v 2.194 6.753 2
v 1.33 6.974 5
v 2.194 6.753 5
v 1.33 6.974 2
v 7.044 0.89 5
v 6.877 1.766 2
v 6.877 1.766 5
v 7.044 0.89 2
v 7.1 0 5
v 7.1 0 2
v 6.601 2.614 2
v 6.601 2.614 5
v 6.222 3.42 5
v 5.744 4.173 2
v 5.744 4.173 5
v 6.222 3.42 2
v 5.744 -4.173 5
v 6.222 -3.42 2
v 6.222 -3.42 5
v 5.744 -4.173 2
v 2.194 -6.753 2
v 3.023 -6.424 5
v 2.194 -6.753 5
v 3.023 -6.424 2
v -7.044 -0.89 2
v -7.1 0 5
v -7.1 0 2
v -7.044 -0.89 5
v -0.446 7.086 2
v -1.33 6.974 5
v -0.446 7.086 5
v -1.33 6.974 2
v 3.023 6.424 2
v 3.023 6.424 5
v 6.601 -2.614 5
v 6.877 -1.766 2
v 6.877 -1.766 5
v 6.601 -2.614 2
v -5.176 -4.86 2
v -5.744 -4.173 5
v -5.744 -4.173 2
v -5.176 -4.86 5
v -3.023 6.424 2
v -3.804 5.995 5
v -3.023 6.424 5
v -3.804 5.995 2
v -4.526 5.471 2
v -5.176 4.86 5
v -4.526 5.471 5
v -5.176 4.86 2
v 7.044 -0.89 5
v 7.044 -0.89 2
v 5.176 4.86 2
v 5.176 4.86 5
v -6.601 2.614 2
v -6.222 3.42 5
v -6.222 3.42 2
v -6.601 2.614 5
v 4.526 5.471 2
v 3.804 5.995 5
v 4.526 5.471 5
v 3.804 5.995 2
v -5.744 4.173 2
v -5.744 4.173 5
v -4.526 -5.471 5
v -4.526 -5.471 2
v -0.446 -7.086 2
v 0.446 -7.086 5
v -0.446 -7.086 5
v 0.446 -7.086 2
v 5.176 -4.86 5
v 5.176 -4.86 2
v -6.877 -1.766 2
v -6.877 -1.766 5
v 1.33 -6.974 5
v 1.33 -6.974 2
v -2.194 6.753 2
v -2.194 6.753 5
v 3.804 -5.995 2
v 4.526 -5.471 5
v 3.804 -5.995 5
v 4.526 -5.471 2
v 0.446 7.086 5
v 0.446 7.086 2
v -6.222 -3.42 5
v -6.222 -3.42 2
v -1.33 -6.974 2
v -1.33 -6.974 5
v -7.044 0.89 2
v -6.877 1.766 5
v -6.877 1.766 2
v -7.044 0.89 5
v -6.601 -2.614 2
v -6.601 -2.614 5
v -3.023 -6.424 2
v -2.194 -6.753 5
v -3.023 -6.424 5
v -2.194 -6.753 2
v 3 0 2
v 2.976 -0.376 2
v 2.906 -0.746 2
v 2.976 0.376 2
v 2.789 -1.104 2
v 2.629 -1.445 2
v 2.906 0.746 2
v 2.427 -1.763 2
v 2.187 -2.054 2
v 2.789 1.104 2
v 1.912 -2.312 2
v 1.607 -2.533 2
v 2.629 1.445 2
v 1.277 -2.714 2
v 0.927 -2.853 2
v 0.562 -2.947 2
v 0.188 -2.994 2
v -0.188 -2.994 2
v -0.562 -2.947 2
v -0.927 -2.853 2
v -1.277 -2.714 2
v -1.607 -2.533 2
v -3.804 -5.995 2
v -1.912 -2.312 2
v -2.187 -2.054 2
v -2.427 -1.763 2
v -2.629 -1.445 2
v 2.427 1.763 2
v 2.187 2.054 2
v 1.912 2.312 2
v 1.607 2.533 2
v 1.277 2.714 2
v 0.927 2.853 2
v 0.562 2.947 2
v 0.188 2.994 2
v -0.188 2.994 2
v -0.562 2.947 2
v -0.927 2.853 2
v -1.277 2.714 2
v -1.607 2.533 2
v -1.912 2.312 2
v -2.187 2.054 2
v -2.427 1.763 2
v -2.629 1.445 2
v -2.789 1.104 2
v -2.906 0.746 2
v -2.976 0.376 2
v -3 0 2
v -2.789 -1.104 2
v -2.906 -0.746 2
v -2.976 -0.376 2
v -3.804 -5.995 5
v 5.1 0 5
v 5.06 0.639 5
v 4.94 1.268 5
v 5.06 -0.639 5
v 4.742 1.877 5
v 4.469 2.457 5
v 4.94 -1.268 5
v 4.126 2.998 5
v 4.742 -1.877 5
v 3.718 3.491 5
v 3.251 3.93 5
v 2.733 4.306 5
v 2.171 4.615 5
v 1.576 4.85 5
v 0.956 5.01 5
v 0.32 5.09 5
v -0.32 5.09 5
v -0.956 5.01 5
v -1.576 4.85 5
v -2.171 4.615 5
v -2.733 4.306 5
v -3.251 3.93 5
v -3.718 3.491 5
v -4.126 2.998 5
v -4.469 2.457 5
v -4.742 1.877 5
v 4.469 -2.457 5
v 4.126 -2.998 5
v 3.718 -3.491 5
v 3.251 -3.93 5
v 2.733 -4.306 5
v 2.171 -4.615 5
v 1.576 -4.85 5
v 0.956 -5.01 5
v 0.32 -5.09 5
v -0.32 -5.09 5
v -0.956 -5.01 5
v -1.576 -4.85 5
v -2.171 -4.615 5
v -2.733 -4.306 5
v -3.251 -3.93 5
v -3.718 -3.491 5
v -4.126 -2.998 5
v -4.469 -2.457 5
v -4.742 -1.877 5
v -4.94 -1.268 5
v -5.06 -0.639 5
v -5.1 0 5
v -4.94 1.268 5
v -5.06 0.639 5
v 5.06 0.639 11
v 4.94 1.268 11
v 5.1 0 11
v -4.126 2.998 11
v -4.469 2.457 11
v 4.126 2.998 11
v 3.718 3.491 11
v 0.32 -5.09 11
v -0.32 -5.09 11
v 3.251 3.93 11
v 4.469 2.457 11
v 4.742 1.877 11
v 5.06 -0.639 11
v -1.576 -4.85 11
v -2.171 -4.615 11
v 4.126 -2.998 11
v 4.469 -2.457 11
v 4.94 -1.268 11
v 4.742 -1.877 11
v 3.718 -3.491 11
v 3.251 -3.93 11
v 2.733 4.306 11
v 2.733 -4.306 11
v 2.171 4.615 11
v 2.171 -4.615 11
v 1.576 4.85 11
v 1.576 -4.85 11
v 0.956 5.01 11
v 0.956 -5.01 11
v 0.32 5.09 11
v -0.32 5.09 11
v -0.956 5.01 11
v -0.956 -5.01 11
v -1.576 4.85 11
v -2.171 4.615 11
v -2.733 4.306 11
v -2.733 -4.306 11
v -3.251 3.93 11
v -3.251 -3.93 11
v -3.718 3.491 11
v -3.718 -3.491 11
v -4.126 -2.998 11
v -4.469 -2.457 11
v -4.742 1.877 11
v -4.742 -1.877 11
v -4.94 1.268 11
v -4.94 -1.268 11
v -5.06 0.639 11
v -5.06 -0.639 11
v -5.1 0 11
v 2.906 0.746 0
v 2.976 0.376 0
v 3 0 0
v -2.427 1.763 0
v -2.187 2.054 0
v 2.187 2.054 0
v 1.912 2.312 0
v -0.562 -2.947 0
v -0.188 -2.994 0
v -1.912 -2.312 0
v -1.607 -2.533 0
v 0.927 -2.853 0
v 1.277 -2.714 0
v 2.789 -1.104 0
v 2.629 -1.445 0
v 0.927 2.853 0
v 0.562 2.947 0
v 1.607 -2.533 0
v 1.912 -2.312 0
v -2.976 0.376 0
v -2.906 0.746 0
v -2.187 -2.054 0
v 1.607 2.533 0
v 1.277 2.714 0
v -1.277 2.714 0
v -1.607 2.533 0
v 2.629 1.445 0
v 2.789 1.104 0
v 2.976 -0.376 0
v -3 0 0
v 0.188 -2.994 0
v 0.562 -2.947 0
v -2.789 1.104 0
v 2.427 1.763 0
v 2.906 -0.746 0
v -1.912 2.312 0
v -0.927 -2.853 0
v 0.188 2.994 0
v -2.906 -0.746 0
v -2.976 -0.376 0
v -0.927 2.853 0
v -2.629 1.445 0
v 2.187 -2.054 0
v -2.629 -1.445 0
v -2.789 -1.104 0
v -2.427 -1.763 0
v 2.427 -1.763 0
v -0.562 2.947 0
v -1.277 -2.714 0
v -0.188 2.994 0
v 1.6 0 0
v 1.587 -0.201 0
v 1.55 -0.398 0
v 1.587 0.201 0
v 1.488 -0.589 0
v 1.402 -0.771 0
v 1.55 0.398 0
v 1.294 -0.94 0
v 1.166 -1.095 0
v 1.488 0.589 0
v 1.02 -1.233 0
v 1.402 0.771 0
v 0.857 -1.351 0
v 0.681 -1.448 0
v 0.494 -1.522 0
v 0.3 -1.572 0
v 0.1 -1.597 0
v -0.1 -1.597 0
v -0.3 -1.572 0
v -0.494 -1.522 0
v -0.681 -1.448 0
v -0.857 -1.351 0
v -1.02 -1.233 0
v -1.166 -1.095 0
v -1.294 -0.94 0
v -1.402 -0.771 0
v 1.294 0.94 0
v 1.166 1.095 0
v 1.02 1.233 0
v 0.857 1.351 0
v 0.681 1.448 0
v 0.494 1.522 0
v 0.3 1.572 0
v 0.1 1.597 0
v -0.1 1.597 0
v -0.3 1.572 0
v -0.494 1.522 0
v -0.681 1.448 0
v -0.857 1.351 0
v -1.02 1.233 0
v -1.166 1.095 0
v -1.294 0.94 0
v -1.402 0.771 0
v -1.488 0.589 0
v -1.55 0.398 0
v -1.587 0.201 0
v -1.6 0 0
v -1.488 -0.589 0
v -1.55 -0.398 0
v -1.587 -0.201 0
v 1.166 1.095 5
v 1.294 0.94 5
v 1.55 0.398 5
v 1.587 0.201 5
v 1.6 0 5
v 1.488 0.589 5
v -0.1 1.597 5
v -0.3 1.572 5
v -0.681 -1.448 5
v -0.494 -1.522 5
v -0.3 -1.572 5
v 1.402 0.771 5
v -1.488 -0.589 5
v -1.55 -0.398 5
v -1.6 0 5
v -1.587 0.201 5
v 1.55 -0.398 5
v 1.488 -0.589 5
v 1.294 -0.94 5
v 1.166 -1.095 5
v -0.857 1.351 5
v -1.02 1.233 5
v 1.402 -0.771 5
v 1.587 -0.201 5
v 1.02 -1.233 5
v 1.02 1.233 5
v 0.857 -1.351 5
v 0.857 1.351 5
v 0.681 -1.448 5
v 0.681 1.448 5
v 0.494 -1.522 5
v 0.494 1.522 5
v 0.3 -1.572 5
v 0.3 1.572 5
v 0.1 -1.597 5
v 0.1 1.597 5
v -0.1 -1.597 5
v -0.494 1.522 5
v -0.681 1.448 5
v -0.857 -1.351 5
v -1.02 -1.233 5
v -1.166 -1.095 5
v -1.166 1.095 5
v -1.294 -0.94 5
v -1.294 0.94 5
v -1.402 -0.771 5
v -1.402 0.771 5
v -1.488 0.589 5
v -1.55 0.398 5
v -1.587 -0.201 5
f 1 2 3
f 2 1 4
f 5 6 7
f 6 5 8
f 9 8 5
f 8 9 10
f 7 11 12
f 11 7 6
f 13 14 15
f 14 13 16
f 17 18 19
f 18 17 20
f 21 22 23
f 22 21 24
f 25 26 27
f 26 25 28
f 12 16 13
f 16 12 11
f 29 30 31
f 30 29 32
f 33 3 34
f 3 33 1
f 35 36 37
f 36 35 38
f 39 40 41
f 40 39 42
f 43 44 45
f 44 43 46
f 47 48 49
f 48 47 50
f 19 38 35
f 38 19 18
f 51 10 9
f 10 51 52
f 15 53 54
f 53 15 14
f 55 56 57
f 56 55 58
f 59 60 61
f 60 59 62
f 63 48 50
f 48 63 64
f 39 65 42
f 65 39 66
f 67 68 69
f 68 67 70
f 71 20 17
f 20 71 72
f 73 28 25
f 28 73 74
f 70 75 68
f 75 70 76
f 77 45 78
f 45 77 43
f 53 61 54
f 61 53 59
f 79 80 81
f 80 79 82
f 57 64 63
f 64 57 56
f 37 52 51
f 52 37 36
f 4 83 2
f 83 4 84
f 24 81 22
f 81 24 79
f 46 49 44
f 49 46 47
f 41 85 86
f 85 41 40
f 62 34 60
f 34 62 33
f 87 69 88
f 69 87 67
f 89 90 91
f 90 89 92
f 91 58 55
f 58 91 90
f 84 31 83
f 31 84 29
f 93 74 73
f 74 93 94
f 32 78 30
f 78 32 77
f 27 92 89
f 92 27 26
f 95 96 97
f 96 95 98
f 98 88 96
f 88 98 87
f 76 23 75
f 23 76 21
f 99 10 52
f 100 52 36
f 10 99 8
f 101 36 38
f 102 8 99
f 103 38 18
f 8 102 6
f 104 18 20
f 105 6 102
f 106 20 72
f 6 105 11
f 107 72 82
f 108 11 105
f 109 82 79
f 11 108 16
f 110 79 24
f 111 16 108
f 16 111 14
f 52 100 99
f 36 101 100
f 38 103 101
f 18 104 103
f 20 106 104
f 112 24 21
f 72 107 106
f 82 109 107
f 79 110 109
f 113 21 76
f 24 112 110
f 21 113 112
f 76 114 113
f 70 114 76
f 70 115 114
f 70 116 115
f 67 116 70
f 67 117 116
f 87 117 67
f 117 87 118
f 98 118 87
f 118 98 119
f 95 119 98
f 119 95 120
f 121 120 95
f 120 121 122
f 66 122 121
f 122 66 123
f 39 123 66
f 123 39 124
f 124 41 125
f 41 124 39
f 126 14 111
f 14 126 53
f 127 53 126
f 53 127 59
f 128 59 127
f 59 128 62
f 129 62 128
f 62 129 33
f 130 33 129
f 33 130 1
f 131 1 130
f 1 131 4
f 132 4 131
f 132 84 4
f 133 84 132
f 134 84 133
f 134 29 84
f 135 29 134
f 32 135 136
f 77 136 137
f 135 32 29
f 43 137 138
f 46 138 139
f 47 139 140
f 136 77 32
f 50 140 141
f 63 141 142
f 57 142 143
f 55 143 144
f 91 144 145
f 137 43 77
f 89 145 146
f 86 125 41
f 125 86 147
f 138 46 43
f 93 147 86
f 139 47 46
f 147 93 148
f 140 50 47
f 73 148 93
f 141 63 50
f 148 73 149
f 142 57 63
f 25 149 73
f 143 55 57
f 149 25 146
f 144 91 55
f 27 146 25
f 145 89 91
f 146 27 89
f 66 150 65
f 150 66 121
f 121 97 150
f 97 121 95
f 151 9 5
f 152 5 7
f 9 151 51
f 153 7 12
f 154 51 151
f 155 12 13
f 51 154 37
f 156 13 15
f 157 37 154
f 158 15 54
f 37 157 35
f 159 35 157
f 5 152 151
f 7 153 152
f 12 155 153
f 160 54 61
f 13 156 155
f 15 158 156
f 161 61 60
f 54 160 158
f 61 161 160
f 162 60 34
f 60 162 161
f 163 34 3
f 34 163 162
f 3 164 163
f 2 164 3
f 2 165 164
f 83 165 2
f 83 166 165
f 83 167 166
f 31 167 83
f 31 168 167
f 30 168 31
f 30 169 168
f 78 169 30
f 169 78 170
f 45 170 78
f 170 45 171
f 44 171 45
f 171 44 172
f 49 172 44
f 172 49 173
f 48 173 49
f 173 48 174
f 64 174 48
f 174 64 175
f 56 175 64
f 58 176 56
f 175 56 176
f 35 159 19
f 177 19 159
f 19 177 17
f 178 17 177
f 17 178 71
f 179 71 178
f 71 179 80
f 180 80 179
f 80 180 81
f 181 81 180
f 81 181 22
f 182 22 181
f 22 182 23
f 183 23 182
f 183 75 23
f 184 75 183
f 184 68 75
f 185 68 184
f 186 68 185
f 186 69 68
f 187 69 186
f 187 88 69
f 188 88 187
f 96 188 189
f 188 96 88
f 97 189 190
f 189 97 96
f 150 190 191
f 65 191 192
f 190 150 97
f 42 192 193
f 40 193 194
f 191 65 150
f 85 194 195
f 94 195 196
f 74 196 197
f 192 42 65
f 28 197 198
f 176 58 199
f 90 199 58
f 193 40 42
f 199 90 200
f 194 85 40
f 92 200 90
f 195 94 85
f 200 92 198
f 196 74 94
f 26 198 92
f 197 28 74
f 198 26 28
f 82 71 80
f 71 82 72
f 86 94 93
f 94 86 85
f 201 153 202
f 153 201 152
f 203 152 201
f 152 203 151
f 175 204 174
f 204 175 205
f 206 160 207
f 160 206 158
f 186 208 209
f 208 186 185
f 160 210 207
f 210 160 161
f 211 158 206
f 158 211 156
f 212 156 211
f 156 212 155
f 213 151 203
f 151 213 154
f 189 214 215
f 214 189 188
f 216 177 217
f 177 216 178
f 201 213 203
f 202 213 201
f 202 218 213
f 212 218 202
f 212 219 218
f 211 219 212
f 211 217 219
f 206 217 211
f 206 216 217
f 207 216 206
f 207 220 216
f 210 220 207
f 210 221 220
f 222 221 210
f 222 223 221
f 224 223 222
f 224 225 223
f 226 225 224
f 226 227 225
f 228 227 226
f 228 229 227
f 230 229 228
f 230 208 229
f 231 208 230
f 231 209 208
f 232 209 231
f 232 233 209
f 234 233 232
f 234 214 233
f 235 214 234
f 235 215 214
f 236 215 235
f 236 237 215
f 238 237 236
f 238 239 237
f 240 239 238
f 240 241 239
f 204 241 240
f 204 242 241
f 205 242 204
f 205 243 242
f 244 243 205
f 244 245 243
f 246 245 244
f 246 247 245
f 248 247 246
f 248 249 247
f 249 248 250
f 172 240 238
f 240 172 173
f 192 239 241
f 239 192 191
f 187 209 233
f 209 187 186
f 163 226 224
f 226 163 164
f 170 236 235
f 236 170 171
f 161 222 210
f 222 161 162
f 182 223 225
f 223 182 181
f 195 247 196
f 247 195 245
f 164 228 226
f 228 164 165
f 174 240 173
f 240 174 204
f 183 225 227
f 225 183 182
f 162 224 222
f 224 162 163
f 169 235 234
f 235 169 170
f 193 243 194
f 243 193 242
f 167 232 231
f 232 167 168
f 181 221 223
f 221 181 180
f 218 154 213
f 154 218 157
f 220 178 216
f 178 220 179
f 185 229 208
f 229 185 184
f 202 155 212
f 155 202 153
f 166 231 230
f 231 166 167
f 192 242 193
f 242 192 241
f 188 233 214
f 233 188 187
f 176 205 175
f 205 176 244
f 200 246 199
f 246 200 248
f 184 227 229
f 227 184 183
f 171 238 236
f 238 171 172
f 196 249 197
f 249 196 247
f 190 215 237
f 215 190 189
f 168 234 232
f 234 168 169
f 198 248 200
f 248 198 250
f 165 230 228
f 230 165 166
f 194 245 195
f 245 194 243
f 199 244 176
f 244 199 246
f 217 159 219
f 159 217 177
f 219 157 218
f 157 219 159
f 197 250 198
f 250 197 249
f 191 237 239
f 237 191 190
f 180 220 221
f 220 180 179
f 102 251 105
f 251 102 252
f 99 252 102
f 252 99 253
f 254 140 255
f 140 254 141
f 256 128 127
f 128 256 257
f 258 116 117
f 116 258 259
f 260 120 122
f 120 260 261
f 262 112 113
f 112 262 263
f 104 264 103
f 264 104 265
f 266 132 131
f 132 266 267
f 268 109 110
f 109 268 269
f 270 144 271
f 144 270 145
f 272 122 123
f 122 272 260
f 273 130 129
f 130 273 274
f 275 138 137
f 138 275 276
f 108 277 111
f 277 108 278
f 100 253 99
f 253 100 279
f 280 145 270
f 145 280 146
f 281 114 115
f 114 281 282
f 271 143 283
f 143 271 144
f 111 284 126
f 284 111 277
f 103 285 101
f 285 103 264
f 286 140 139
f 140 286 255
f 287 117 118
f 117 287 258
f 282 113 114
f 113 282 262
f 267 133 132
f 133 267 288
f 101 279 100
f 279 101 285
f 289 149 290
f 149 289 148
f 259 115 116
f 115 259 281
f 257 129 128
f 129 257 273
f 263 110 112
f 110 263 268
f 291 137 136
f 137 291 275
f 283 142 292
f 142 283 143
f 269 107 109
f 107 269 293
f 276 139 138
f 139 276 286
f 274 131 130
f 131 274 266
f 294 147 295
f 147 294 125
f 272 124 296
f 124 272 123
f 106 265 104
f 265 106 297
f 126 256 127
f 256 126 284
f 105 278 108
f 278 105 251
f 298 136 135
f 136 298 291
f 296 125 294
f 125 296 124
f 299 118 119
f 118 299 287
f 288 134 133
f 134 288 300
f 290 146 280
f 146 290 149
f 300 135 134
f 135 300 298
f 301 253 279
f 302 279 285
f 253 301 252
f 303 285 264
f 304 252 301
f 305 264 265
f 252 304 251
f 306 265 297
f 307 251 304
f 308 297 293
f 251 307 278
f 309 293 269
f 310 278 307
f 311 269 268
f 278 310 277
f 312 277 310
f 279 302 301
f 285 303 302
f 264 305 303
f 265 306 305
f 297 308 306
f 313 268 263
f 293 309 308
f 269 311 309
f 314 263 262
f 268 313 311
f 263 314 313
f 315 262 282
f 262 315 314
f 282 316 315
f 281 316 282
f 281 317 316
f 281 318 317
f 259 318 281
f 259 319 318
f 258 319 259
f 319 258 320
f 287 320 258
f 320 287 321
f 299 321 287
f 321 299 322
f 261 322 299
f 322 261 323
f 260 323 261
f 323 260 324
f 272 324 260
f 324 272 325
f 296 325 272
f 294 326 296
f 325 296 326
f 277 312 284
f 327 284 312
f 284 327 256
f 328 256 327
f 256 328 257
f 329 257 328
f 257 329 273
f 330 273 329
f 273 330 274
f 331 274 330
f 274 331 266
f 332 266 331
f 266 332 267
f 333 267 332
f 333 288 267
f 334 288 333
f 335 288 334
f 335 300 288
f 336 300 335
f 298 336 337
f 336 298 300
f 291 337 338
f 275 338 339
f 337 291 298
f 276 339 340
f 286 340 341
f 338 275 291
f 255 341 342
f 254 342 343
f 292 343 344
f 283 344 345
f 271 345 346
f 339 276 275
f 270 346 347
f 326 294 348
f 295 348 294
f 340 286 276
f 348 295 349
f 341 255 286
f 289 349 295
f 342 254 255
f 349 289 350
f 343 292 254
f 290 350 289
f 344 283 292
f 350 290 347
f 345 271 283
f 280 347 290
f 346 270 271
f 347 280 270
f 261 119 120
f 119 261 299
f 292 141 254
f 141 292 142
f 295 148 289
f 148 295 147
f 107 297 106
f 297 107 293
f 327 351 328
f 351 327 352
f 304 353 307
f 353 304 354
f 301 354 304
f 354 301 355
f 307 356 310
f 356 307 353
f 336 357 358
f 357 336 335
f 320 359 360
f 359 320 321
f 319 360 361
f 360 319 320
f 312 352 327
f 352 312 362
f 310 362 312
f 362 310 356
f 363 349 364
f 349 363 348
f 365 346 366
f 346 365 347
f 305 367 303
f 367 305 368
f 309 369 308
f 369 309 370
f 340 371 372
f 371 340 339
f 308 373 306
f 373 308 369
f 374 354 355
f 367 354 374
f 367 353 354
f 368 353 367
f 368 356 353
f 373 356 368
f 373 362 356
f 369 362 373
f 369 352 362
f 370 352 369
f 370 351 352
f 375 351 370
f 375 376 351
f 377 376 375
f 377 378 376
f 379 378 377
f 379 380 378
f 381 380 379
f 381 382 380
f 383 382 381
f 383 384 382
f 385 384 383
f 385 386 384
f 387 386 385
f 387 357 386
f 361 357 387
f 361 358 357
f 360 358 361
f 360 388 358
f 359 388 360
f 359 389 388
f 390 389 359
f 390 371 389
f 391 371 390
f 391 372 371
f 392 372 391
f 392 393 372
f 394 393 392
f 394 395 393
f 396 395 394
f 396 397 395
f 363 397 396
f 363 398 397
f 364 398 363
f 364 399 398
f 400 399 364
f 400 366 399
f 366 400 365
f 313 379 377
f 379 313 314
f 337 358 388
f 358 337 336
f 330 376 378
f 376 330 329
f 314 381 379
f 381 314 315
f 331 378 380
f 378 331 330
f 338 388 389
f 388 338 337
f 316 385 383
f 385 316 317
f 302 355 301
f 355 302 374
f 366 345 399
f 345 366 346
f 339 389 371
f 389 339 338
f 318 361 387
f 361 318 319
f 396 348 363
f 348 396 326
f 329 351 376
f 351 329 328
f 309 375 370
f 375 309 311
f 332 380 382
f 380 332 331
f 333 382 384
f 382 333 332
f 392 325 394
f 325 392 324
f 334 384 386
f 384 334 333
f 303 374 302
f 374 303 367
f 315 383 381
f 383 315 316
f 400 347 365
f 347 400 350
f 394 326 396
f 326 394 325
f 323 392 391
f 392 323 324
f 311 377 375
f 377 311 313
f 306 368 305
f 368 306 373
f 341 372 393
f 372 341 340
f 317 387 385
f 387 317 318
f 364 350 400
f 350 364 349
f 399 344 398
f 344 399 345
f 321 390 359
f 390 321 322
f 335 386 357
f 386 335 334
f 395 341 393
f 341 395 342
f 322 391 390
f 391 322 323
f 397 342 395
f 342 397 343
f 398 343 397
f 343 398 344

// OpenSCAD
$fn = 50;
button_h = 13;
overlap = 5;
//total_height = 22;
total_height = 19;
th = 2; // enclosure thickness
eps = 1e-1;

cap_r = 10.2 / 2;
cap_h = total_height - button_h + overlap;
cap_r_bottom = 3;

border_offset = 4 + th;
border_h = 3;
border_r = cap_r + 2;

socket_r = 3.2 / 2;

difference() {
  union() {
    cylinder(r=cap_r_bottom, h=cap_h);
    translate([0, 0, cap_h - border_h - border_offset]) {
      cylinder(r=border_r, h=border_h);
      cylinder(r=cap_r, h=border_h + border_offset);
    }
  }
  translate([0, 0, -eps]) {
    cylinder(r=socket_r, h=overlap+eps);
  }
}
